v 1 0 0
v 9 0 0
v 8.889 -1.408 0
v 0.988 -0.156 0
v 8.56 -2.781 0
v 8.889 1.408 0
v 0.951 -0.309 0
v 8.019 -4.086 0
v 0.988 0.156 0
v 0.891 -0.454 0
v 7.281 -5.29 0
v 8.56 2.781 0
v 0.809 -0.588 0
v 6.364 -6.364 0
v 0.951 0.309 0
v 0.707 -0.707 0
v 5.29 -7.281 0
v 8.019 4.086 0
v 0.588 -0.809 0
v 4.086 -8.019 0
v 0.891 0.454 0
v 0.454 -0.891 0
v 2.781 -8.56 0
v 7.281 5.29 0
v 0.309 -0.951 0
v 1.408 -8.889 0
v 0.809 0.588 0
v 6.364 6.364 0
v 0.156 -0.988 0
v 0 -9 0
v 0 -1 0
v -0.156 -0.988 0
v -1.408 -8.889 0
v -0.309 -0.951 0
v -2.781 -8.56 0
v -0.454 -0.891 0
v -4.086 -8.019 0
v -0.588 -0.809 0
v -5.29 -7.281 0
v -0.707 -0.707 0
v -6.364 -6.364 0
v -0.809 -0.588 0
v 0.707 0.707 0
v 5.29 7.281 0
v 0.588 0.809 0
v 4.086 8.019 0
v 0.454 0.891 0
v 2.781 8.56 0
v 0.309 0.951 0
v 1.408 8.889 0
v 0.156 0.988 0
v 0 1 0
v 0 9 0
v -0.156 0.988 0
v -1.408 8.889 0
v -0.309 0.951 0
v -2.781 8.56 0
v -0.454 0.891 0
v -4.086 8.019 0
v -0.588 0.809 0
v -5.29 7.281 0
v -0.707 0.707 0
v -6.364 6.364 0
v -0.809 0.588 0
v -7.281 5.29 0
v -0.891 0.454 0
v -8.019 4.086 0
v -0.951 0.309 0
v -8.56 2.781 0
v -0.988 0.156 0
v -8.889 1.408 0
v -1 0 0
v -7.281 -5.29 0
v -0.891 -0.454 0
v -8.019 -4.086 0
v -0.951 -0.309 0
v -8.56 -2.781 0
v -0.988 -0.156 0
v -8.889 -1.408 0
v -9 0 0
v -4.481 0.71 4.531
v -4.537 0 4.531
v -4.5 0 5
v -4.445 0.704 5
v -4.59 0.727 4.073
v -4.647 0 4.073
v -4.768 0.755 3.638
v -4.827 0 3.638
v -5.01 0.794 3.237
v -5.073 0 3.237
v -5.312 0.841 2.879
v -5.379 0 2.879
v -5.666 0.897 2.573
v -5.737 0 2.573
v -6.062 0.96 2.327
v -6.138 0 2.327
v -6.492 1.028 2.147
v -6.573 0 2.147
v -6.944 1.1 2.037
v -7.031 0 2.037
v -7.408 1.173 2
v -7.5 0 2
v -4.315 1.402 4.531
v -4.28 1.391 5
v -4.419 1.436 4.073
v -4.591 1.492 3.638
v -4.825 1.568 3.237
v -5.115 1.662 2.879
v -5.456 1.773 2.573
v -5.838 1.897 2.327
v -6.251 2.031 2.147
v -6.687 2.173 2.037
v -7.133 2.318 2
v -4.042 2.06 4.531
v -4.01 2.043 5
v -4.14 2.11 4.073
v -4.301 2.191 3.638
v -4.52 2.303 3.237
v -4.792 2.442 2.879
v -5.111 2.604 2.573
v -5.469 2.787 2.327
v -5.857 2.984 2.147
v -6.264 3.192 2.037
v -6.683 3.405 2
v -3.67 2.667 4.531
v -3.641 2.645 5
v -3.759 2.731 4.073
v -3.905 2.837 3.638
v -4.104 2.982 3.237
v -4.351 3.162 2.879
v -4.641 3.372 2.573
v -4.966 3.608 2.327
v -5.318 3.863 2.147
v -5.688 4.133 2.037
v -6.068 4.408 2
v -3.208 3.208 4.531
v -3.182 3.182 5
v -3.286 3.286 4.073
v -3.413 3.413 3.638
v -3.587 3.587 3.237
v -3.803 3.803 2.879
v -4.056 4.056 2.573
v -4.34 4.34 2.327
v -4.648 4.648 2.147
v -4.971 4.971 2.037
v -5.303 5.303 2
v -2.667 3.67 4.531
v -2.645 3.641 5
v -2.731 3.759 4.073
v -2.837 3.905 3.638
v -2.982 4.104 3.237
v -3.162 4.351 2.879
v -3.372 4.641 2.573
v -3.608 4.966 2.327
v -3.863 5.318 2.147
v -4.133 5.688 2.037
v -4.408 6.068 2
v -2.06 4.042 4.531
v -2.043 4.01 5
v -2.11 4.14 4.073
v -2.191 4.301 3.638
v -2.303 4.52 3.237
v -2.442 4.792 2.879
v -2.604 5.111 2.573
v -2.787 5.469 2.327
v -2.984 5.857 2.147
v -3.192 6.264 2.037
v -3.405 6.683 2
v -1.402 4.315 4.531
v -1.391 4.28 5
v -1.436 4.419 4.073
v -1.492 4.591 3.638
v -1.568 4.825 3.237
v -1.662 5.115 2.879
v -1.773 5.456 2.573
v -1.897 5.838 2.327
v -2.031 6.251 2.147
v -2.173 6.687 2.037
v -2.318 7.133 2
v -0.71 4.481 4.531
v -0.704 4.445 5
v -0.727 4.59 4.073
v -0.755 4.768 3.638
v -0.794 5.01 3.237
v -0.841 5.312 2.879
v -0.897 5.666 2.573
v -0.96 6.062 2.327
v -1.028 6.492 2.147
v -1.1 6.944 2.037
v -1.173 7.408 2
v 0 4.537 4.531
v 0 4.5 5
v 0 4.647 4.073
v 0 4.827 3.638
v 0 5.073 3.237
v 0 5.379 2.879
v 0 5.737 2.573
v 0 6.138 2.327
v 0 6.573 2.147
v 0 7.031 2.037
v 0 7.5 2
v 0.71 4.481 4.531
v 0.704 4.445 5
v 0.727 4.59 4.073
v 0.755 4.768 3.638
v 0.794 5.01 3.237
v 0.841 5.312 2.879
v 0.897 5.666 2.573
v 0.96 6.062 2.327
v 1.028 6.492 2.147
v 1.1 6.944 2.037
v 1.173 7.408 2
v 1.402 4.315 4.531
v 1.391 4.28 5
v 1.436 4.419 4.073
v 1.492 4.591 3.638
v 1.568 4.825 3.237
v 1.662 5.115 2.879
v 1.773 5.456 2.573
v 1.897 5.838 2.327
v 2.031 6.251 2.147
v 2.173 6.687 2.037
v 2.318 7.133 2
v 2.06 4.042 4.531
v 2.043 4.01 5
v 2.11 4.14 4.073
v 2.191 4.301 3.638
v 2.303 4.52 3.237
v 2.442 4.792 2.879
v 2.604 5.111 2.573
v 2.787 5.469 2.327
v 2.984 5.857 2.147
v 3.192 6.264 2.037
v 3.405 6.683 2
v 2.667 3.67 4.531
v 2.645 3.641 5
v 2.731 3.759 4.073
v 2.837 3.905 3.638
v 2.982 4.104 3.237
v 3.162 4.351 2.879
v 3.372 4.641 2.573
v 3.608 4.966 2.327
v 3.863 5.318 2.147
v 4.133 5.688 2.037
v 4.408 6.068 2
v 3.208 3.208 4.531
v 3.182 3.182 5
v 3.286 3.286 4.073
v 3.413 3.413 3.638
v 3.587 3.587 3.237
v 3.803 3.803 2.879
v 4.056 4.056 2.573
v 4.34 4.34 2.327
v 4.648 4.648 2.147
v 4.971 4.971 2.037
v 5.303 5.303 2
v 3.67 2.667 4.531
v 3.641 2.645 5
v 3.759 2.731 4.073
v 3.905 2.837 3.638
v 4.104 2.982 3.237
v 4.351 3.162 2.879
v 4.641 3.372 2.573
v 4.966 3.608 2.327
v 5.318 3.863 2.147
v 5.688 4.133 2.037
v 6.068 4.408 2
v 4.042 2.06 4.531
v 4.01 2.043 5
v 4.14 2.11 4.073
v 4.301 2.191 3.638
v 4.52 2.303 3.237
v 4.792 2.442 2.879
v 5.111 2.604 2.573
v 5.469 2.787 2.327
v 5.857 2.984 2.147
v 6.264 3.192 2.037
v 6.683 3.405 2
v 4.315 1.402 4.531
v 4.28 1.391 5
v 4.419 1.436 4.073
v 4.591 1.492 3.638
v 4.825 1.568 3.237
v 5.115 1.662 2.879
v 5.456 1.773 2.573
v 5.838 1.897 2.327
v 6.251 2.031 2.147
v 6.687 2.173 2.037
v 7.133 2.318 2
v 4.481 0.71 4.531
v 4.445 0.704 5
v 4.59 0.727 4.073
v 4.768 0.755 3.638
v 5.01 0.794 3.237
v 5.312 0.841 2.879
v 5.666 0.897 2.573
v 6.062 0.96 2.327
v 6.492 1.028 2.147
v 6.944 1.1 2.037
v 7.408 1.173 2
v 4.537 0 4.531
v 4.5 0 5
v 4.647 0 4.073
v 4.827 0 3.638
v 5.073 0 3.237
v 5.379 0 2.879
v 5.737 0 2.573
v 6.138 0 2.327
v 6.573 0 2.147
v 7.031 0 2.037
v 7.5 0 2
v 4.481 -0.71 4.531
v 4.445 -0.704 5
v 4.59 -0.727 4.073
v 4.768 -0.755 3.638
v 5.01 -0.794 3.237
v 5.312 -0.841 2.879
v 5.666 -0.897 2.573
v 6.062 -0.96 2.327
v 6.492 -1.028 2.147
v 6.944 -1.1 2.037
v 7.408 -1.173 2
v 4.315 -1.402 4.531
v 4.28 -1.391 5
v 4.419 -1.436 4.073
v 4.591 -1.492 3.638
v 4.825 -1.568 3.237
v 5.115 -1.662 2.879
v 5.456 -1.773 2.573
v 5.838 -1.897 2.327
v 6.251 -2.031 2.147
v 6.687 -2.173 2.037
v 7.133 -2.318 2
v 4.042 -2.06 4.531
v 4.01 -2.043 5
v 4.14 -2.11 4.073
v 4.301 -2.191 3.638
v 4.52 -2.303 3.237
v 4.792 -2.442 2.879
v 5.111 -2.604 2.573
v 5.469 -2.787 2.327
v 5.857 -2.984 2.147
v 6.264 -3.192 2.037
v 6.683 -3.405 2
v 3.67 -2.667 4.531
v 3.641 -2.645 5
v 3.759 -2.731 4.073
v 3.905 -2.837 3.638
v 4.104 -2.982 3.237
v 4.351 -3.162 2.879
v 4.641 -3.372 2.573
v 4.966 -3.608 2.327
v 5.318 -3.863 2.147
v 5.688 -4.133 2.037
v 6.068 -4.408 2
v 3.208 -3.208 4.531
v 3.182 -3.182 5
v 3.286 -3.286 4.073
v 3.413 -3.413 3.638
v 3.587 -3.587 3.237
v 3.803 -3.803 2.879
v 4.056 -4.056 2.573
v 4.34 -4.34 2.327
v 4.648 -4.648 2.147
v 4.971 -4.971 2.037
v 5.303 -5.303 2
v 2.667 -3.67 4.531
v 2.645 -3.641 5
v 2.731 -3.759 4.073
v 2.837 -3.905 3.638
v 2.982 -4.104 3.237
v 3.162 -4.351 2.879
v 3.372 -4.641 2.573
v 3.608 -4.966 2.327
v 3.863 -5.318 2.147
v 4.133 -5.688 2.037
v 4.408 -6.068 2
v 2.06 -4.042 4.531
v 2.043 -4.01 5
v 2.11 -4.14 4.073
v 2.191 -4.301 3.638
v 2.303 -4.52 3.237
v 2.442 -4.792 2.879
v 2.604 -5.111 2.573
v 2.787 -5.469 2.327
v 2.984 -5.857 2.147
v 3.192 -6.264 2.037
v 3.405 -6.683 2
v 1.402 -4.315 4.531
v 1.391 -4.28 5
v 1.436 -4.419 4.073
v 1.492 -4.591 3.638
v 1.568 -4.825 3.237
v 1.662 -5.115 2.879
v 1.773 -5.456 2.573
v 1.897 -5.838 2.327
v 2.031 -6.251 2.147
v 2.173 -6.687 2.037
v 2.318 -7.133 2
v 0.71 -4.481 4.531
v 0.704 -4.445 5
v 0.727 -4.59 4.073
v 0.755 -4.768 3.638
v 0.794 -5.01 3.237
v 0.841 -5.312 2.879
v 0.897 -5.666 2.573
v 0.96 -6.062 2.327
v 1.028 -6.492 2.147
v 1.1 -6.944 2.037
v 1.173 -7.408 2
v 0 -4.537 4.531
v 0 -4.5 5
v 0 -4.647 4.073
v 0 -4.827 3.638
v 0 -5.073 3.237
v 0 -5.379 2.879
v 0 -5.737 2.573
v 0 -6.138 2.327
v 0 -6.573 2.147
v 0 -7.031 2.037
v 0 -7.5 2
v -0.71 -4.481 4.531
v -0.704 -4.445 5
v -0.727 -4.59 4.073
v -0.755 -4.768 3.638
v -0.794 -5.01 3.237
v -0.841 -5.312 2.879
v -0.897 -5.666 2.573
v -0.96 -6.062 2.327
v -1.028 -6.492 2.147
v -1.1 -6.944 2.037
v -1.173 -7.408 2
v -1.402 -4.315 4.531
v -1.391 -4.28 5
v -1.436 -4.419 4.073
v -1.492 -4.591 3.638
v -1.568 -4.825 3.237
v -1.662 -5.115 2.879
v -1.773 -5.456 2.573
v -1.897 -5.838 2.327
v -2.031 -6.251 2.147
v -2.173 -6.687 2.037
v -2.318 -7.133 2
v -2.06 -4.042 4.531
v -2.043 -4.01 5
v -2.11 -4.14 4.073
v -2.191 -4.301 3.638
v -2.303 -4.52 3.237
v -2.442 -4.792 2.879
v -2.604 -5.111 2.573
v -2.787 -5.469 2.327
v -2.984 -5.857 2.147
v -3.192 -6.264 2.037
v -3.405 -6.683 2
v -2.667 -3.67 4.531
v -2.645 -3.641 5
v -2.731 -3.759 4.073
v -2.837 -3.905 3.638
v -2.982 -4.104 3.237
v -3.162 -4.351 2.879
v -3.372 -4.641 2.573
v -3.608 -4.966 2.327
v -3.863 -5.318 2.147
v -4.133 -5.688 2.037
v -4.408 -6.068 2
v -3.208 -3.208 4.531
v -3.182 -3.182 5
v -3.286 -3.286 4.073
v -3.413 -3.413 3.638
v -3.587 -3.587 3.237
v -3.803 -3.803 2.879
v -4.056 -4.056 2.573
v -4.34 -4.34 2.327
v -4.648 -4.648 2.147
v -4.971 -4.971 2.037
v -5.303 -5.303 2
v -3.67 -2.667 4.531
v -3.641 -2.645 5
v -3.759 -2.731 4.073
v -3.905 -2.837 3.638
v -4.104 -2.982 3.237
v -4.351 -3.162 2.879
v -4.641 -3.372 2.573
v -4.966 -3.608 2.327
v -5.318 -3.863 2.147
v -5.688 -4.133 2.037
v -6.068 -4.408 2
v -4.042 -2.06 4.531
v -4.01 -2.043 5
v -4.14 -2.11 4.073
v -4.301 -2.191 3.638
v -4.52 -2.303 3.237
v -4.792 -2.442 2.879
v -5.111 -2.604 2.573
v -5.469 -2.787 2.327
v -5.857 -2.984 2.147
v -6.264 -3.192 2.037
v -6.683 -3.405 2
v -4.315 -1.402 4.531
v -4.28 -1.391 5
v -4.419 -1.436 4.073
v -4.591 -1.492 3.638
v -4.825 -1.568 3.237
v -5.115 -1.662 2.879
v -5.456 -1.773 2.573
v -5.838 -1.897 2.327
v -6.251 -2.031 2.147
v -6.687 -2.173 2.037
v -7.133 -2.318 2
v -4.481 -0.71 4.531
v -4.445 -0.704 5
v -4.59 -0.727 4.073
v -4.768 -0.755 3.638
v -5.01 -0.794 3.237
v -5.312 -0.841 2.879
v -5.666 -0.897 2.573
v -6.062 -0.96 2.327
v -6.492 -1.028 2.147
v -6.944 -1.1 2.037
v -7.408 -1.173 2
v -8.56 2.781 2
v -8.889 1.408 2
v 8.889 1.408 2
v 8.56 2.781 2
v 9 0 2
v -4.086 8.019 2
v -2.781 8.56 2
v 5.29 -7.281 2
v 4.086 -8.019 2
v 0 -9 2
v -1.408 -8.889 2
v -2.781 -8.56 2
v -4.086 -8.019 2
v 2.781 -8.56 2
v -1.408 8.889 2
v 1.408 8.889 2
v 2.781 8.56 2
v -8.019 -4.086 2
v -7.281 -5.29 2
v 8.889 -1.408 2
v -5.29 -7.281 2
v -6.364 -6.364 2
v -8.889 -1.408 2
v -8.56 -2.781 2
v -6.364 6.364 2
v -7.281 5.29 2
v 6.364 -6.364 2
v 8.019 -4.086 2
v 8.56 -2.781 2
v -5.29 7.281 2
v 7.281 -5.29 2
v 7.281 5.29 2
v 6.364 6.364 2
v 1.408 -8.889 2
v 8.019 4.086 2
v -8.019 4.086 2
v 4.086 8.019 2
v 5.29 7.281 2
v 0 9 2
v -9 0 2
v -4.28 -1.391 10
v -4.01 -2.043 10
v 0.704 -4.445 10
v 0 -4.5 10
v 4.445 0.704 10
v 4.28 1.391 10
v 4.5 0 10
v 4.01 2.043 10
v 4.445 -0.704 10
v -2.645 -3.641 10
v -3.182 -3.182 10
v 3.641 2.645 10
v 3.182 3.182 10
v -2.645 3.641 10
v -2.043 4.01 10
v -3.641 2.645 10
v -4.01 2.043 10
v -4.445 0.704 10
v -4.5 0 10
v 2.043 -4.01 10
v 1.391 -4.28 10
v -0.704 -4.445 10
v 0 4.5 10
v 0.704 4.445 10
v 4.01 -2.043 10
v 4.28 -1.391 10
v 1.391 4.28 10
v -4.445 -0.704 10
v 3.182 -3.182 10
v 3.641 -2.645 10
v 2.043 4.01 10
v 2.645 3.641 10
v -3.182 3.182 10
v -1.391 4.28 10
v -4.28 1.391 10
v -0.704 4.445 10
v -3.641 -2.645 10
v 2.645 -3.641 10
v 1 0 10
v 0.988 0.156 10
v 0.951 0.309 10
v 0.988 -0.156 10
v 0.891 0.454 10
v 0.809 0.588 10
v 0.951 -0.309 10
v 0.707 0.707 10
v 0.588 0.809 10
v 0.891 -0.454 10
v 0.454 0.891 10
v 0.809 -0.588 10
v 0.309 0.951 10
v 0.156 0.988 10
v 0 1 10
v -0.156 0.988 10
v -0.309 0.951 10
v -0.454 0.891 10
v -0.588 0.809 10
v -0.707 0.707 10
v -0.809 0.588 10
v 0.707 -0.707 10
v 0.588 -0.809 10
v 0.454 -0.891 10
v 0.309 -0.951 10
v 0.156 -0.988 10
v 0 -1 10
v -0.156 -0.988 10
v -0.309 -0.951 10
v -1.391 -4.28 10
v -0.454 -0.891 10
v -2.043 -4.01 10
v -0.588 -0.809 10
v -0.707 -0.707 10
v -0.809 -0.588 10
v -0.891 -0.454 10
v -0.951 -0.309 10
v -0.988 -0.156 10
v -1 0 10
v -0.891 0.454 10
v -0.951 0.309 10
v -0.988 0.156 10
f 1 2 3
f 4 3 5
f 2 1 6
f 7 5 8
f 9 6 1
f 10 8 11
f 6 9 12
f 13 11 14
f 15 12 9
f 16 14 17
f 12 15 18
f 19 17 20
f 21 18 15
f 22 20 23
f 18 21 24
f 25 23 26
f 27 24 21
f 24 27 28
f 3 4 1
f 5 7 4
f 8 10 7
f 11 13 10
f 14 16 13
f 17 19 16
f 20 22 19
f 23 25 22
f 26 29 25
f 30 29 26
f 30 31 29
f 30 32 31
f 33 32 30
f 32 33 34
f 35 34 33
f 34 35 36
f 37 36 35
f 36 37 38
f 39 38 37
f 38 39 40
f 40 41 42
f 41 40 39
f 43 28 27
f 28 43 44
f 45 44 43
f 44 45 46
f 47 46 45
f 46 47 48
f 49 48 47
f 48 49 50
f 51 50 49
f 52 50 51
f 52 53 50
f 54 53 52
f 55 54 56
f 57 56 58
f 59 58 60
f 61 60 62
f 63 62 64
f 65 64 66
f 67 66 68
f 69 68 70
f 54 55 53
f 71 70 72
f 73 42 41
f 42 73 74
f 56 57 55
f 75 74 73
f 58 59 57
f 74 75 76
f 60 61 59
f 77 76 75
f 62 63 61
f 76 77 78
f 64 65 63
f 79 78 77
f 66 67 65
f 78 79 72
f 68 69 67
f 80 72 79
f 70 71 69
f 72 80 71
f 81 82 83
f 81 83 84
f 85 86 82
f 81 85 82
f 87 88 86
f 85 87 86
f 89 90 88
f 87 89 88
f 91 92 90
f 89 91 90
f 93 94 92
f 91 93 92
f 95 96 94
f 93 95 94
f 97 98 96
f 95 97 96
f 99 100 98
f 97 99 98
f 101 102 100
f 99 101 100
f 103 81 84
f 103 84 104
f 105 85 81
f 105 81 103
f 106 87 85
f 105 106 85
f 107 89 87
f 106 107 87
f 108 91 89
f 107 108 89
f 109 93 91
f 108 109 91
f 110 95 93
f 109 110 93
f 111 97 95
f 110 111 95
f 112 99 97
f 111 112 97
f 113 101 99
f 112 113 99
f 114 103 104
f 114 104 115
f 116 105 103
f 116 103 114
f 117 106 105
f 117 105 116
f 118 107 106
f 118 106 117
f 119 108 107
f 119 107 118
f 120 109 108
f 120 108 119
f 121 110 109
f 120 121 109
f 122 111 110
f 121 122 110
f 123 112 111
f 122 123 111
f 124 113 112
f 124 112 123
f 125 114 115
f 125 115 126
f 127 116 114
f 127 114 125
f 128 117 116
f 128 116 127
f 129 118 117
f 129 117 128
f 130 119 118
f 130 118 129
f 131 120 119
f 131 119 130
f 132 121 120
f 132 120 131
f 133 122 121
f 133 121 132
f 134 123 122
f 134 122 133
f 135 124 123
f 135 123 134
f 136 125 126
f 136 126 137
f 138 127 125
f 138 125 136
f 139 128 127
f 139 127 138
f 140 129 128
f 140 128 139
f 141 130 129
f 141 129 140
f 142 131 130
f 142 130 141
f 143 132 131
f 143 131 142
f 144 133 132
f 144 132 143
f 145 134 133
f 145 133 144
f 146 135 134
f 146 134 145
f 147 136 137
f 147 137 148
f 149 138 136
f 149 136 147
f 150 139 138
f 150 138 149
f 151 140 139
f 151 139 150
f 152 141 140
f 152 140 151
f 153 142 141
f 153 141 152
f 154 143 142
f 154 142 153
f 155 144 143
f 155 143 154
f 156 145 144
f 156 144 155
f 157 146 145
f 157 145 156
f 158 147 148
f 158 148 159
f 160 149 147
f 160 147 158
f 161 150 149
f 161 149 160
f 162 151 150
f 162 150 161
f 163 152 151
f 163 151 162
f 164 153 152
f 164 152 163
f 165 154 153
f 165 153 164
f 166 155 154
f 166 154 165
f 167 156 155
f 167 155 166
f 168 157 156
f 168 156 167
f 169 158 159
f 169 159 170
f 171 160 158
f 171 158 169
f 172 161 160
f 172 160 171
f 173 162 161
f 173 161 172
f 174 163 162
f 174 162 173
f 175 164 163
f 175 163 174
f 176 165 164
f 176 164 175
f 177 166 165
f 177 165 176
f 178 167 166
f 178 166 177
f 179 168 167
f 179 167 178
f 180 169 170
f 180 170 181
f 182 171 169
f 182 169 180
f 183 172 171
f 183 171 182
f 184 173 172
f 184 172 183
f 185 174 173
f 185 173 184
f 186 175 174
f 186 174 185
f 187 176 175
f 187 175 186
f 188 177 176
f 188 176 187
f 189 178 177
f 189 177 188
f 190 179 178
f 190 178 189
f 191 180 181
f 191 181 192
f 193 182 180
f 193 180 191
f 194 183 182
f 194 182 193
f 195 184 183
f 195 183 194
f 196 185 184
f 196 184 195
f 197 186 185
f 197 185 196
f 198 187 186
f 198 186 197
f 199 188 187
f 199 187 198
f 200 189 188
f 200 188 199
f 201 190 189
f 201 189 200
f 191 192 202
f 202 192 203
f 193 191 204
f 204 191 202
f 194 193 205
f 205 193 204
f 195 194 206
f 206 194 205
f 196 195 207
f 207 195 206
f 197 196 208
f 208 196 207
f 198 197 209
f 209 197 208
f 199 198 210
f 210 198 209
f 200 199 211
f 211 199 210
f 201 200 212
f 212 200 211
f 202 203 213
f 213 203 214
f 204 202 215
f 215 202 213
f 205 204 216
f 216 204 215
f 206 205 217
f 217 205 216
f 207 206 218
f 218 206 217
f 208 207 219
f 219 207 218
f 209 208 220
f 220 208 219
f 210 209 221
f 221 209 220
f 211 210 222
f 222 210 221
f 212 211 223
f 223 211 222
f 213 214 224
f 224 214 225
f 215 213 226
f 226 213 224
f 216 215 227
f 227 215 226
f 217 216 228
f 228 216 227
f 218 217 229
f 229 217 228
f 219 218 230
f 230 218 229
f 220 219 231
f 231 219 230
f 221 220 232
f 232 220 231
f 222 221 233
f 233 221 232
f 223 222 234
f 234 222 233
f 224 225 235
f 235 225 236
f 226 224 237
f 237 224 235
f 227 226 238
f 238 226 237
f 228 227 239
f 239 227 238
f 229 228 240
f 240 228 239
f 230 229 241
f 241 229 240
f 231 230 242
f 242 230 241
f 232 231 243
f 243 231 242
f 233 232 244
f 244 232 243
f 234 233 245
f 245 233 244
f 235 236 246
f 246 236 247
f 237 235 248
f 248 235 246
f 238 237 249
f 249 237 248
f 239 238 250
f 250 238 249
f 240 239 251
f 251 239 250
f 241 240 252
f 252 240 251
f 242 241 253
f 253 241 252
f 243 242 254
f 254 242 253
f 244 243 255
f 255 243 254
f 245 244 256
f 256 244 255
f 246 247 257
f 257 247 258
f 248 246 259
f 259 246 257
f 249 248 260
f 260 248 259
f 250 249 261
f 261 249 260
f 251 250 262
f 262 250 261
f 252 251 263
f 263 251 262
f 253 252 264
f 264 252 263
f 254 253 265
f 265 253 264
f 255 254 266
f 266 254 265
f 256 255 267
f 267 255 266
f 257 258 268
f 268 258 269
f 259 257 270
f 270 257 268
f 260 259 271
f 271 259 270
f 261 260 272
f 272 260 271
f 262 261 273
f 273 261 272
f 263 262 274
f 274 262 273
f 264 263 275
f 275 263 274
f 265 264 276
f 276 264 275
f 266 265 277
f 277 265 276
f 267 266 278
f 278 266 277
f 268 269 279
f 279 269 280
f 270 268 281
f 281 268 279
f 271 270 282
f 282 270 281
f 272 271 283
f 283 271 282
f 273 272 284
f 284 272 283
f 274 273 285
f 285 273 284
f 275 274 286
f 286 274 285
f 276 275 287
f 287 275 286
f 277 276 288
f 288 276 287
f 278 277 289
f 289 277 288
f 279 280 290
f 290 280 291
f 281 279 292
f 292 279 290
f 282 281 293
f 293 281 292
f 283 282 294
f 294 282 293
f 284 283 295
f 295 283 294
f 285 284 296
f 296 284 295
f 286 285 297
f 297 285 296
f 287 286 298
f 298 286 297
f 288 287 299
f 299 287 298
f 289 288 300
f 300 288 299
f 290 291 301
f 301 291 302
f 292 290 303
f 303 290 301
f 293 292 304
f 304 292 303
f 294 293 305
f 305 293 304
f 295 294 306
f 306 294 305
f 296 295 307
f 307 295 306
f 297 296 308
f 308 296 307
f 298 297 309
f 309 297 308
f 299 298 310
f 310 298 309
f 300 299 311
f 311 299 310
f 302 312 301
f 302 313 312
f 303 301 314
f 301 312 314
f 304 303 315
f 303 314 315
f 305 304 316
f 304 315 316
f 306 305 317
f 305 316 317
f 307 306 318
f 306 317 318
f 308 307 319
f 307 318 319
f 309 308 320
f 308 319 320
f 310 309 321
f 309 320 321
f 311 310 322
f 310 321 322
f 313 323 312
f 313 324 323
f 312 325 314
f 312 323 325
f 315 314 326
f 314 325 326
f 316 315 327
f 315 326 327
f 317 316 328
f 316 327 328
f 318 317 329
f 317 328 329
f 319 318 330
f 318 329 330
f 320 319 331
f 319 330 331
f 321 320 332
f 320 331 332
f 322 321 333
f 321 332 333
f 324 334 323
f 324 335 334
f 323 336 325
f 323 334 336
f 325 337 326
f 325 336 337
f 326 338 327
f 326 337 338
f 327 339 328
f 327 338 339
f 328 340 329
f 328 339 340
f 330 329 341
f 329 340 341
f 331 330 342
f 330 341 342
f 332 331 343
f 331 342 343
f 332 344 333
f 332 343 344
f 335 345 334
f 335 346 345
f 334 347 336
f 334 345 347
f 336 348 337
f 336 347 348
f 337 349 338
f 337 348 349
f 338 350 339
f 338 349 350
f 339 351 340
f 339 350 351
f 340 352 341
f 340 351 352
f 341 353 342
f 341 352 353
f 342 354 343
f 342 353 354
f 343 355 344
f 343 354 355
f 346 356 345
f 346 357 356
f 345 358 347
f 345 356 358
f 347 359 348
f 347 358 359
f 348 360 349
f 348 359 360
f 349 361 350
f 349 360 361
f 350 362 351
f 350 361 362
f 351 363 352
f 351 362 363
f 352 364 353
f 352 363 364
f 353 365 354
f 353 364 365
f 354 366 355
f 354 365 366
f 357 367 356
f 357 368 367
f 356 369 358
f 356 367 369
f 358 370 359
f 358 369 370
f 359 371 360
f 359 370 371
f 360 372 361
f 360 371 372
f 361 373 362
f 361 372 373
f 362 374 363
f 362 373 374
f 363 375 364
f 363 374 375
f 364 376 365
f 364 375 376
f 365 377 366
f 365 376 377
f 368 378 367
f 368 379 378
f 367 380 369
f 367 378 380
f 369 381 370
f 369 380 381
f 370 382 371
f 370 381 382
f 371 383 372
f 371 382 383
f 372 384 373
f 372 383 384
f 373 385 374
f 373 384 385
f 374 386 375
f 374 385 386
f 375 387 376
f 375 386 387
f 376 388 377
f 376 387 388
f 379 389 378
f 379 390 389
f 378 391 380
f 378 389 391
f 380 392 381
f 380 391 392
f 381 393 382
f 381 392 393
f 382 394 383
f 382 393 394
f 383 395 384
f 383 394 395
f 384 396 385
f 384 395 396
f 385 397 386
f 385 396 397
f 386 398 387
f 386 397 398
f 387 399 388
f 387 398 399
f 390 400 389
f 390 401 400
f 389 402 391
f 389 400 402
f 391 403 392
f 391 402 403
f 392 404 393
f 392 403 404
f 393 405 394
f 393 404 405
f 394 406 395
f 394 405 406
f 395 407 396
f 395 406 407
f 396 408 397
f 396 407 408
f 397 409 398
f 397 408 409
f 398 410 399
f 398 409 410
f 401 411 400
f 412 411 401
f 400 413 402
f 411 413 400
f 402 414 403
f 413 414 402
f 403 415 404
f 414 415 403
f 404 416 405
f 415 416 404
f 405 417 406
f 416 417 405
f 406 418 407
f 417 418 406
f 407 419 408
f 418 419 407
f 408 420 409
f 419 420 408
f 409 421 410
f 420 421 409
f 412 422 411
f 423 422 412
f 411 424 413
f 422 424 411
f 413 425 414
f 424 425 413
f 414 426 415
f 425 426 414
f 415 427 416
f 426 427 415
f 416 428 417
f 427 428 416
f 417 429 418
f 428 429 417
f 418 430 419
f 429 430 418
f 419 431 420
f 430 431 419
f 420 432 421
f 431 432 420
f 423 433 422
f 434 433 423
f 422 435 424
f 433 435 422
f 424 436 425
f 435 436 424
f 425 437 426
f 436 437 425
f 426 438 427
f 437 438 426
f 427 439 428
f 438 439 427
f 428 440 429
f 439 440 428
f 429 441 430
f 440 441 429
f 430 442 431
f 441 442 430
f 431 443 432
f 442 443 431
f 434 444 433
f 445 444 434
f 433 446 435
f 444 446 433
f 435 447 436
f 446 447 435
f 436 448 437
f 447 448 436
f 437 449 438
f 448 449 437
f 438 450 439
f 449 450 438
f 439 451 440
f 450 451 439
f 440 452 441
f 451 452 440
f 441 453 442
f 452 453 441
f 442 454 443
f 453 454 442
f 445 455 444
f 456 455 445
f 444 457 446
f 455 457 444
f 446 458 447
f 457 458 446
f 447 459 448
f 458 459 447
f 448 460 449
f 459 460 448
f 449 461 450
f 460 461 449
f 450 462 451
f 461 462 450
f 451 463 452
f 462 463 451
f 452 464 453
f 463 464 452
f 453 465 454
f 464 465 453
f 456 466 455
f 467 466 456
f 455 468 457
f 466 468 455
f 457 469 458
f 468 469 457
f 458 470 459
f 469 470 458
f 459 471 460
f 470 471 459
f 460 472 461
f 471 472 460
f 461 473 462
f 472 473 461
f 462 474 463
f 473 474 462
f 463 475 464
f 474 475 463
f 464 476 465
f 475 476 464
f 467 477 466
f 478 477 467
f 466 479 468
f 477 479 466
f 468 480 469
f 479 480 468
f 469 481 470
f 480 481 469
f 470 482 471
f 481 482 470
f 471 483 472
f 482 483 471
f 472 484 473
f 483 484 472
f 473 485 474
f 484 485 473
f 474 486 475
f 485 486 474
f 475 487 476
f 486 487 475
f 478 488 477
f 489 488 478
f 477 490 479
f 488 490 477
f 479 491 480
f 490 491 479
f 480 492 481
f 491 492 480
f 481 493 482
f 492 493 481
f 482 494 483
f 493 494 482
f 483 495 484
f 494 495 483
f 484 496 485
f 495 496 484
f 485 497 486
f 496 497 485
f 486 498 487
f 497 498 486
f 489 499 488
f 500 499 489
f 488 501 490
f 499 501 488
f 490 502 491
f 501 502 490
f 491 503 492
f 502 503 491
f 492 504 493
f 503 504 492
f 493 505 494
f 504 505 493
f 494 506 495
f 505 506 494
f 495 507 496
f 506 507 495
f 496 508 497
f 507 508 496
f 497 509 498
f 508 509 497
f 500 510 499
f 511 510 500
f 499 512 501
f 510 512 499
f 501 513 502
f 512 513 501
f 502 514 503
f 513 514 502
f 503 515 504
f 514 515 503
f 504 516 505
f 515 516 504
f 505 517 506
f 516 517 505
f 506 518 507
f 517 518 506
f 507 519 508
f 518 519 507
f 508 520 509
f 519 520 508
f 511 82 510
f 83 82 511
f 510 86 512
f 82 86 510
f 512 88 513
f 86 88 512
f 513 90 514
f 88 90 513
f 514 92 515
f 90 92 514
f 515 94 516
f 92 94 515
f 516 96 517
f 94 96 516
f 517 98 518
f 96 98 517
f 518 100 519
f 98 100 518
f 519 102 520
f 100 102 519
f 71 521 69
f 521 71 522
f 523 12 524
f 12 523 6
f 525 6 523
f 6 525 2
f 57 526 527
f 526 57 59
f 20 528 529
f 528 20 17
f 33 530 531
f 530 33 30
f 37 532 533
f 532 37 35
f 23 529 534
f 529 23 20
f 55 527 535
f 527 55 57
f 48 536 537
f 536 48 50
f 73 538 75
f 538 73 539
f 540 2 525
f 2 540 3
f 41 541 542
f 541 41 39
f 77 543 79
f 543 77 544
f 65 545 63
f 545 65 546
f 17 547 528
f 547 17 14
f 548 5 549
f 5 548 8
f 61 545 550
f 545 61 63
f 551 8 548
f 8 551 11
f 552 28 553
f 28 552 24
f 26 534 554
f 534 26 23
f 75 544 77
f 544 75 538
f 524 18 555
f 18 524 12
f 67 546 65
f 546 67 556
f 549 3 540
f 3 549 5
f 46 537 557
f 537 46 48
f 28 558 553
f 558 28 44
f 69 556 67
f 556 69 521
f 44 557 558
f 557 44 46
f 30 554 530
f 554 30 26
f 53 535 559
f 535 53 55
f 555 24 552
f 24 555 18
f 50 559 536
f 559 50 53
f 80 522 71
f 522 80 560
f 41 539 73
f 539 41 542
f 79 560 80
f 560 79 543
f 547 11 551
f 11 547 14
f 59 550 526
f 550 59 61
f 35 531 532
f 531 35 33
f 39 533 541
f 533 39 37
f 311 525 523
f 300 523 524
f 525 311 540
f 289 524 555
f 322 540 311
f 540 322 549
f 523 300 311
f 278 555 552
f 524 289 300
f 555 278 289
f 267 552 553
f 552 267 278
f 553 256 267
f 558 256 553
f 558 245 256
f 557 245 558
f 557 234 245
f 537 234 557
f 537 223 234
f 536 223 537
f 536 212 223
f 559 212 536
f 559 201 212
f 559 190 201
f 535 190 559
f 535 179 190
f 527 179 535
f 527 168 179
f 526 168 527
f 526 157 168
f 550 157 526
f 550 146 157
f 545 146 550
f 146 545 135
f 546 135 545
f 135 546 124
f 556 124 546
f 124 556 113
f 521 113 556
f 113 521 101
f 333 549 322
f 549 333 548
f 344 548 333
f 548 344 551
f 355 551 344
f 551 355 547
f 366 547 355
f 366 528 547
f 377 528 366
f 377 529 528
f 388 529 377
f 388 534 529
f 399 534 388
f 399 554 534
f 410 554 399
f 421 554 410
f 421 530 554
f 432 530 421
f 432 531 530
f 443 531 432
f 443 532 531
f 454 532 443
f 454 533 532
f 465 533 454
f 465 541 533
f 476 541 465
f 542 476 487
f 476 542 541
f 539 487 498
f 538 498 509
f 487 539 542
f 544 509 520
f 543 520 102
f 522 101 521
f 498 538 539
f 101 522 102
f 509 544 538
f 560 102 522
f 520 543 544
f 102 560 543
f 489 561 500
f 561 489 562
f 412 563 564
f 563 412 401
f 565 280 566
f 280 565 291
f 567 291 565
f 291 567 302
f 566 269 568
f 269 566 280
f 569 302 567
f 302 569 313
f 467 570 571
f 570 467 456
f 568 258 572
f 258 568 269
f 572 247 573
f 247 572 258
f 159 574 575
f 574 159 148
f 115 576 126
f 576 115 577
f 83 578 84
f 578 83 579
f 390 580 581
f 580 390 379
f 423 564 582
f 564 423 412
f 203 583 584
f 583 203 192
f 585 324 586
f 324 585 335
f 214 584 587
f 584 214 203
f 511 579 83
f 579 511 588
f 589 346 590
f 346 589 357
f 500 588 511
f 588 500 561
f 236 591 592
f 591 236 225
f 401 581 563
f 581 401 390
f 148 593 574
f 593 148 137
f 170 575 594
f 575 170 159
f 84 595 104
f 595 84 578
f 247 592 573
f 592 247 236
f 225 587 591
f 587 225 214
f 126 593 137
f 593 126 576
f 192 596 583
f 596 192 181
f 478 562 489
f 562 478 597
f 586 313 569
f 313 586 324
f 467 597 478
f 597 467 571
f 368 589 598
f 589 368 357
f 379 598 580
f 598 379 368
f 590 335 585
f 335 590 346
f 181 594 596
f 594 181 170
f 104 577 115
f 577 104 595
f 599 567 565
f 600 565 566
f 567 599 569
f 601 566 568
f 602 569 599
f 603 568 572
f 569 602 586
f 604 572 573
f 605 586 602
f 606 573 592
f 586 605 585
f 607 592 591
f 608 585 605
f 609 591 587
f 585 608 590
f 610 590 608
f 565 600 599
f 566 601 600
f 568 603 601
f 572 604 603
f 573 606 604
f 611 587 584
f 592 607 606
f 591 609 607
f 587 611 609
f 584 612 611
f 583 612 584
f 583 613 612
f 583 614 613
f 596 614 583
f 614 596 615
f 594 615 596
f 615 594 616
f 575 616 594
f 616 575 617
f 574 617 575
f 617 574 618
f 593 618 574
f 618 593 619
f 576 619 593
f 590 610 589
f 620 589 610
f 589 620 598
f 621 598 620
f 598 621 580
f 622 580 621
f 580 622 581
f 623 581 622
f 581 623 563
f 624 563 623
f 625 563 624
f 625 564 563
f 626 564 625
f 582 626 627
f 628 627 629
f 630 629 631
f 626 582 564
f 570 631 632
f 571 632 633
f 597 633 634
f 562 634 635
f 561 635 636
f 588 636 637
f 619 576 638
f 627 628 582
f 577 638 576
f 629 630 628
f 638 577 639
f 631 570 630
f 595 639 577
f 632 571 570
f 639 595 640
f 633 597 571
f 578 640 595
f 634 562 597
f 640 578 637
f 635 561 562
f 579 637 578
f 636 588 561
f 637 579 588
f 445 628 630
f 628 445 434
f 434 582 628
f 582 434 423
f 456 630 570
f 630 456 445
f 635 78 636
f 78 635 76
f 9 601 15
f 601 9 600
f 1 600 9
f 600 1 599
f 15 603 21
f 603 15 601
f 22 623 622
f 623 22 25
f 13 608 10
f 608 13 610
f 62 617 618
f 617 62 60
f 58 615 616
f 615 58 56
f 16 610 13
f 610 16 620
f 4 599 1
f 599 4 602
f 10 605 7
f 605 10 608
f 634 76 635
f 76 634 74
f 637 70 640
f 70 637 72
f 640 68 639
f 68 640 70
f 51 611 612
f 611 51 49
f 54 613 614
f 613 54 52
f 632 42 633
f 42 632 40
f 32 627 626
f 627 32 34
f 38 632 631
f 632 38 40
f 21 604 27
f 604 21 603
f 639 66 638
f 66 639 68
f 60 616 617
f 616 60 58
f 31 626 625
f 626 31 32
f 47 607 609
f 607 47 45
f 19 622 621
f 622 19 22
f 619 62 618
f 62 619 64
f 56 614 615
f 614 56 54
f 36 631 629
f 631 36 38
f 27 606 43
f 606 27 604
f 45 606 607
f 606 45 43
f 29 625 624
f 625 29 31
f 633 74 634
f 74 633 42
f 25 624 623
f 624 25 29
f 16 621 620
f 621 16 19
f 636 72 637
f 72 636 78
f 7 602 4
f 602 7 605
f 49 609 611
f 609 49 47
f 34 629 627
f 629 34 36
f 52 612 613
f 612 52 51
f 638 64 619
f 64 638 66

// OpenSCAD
$fn=40;

WHOLE_HT = 10;
BASE_RD = 18/2;
BASE_HT = 2;
SHAFT_RD = 9/2;

FILLET_RD = 3;


difference(){
    union(){
        cylinder(h =BASE_HT , r = BASE_RD);
        
        cylinder(h = WHOLE_HT, r = SHAFT_RD);
        
        difference(){
            cylinder(h = FILLET_RD + BASE_HT, r = SHAFT_RD + FILLET_RD);
        
            translate([0, 0, FILLET_RD + BASE_HT]){
                rotate_extrude(angle=360) {
                    translate([SHAFT_RD + FILLET_RD, 0, 0]){
                        circle(r = FILLET_RD);
                    }
                }
                
            }
        }
    }
    cylinder(h = WHOLE_HT * 1.1, r = 2/2);
}
